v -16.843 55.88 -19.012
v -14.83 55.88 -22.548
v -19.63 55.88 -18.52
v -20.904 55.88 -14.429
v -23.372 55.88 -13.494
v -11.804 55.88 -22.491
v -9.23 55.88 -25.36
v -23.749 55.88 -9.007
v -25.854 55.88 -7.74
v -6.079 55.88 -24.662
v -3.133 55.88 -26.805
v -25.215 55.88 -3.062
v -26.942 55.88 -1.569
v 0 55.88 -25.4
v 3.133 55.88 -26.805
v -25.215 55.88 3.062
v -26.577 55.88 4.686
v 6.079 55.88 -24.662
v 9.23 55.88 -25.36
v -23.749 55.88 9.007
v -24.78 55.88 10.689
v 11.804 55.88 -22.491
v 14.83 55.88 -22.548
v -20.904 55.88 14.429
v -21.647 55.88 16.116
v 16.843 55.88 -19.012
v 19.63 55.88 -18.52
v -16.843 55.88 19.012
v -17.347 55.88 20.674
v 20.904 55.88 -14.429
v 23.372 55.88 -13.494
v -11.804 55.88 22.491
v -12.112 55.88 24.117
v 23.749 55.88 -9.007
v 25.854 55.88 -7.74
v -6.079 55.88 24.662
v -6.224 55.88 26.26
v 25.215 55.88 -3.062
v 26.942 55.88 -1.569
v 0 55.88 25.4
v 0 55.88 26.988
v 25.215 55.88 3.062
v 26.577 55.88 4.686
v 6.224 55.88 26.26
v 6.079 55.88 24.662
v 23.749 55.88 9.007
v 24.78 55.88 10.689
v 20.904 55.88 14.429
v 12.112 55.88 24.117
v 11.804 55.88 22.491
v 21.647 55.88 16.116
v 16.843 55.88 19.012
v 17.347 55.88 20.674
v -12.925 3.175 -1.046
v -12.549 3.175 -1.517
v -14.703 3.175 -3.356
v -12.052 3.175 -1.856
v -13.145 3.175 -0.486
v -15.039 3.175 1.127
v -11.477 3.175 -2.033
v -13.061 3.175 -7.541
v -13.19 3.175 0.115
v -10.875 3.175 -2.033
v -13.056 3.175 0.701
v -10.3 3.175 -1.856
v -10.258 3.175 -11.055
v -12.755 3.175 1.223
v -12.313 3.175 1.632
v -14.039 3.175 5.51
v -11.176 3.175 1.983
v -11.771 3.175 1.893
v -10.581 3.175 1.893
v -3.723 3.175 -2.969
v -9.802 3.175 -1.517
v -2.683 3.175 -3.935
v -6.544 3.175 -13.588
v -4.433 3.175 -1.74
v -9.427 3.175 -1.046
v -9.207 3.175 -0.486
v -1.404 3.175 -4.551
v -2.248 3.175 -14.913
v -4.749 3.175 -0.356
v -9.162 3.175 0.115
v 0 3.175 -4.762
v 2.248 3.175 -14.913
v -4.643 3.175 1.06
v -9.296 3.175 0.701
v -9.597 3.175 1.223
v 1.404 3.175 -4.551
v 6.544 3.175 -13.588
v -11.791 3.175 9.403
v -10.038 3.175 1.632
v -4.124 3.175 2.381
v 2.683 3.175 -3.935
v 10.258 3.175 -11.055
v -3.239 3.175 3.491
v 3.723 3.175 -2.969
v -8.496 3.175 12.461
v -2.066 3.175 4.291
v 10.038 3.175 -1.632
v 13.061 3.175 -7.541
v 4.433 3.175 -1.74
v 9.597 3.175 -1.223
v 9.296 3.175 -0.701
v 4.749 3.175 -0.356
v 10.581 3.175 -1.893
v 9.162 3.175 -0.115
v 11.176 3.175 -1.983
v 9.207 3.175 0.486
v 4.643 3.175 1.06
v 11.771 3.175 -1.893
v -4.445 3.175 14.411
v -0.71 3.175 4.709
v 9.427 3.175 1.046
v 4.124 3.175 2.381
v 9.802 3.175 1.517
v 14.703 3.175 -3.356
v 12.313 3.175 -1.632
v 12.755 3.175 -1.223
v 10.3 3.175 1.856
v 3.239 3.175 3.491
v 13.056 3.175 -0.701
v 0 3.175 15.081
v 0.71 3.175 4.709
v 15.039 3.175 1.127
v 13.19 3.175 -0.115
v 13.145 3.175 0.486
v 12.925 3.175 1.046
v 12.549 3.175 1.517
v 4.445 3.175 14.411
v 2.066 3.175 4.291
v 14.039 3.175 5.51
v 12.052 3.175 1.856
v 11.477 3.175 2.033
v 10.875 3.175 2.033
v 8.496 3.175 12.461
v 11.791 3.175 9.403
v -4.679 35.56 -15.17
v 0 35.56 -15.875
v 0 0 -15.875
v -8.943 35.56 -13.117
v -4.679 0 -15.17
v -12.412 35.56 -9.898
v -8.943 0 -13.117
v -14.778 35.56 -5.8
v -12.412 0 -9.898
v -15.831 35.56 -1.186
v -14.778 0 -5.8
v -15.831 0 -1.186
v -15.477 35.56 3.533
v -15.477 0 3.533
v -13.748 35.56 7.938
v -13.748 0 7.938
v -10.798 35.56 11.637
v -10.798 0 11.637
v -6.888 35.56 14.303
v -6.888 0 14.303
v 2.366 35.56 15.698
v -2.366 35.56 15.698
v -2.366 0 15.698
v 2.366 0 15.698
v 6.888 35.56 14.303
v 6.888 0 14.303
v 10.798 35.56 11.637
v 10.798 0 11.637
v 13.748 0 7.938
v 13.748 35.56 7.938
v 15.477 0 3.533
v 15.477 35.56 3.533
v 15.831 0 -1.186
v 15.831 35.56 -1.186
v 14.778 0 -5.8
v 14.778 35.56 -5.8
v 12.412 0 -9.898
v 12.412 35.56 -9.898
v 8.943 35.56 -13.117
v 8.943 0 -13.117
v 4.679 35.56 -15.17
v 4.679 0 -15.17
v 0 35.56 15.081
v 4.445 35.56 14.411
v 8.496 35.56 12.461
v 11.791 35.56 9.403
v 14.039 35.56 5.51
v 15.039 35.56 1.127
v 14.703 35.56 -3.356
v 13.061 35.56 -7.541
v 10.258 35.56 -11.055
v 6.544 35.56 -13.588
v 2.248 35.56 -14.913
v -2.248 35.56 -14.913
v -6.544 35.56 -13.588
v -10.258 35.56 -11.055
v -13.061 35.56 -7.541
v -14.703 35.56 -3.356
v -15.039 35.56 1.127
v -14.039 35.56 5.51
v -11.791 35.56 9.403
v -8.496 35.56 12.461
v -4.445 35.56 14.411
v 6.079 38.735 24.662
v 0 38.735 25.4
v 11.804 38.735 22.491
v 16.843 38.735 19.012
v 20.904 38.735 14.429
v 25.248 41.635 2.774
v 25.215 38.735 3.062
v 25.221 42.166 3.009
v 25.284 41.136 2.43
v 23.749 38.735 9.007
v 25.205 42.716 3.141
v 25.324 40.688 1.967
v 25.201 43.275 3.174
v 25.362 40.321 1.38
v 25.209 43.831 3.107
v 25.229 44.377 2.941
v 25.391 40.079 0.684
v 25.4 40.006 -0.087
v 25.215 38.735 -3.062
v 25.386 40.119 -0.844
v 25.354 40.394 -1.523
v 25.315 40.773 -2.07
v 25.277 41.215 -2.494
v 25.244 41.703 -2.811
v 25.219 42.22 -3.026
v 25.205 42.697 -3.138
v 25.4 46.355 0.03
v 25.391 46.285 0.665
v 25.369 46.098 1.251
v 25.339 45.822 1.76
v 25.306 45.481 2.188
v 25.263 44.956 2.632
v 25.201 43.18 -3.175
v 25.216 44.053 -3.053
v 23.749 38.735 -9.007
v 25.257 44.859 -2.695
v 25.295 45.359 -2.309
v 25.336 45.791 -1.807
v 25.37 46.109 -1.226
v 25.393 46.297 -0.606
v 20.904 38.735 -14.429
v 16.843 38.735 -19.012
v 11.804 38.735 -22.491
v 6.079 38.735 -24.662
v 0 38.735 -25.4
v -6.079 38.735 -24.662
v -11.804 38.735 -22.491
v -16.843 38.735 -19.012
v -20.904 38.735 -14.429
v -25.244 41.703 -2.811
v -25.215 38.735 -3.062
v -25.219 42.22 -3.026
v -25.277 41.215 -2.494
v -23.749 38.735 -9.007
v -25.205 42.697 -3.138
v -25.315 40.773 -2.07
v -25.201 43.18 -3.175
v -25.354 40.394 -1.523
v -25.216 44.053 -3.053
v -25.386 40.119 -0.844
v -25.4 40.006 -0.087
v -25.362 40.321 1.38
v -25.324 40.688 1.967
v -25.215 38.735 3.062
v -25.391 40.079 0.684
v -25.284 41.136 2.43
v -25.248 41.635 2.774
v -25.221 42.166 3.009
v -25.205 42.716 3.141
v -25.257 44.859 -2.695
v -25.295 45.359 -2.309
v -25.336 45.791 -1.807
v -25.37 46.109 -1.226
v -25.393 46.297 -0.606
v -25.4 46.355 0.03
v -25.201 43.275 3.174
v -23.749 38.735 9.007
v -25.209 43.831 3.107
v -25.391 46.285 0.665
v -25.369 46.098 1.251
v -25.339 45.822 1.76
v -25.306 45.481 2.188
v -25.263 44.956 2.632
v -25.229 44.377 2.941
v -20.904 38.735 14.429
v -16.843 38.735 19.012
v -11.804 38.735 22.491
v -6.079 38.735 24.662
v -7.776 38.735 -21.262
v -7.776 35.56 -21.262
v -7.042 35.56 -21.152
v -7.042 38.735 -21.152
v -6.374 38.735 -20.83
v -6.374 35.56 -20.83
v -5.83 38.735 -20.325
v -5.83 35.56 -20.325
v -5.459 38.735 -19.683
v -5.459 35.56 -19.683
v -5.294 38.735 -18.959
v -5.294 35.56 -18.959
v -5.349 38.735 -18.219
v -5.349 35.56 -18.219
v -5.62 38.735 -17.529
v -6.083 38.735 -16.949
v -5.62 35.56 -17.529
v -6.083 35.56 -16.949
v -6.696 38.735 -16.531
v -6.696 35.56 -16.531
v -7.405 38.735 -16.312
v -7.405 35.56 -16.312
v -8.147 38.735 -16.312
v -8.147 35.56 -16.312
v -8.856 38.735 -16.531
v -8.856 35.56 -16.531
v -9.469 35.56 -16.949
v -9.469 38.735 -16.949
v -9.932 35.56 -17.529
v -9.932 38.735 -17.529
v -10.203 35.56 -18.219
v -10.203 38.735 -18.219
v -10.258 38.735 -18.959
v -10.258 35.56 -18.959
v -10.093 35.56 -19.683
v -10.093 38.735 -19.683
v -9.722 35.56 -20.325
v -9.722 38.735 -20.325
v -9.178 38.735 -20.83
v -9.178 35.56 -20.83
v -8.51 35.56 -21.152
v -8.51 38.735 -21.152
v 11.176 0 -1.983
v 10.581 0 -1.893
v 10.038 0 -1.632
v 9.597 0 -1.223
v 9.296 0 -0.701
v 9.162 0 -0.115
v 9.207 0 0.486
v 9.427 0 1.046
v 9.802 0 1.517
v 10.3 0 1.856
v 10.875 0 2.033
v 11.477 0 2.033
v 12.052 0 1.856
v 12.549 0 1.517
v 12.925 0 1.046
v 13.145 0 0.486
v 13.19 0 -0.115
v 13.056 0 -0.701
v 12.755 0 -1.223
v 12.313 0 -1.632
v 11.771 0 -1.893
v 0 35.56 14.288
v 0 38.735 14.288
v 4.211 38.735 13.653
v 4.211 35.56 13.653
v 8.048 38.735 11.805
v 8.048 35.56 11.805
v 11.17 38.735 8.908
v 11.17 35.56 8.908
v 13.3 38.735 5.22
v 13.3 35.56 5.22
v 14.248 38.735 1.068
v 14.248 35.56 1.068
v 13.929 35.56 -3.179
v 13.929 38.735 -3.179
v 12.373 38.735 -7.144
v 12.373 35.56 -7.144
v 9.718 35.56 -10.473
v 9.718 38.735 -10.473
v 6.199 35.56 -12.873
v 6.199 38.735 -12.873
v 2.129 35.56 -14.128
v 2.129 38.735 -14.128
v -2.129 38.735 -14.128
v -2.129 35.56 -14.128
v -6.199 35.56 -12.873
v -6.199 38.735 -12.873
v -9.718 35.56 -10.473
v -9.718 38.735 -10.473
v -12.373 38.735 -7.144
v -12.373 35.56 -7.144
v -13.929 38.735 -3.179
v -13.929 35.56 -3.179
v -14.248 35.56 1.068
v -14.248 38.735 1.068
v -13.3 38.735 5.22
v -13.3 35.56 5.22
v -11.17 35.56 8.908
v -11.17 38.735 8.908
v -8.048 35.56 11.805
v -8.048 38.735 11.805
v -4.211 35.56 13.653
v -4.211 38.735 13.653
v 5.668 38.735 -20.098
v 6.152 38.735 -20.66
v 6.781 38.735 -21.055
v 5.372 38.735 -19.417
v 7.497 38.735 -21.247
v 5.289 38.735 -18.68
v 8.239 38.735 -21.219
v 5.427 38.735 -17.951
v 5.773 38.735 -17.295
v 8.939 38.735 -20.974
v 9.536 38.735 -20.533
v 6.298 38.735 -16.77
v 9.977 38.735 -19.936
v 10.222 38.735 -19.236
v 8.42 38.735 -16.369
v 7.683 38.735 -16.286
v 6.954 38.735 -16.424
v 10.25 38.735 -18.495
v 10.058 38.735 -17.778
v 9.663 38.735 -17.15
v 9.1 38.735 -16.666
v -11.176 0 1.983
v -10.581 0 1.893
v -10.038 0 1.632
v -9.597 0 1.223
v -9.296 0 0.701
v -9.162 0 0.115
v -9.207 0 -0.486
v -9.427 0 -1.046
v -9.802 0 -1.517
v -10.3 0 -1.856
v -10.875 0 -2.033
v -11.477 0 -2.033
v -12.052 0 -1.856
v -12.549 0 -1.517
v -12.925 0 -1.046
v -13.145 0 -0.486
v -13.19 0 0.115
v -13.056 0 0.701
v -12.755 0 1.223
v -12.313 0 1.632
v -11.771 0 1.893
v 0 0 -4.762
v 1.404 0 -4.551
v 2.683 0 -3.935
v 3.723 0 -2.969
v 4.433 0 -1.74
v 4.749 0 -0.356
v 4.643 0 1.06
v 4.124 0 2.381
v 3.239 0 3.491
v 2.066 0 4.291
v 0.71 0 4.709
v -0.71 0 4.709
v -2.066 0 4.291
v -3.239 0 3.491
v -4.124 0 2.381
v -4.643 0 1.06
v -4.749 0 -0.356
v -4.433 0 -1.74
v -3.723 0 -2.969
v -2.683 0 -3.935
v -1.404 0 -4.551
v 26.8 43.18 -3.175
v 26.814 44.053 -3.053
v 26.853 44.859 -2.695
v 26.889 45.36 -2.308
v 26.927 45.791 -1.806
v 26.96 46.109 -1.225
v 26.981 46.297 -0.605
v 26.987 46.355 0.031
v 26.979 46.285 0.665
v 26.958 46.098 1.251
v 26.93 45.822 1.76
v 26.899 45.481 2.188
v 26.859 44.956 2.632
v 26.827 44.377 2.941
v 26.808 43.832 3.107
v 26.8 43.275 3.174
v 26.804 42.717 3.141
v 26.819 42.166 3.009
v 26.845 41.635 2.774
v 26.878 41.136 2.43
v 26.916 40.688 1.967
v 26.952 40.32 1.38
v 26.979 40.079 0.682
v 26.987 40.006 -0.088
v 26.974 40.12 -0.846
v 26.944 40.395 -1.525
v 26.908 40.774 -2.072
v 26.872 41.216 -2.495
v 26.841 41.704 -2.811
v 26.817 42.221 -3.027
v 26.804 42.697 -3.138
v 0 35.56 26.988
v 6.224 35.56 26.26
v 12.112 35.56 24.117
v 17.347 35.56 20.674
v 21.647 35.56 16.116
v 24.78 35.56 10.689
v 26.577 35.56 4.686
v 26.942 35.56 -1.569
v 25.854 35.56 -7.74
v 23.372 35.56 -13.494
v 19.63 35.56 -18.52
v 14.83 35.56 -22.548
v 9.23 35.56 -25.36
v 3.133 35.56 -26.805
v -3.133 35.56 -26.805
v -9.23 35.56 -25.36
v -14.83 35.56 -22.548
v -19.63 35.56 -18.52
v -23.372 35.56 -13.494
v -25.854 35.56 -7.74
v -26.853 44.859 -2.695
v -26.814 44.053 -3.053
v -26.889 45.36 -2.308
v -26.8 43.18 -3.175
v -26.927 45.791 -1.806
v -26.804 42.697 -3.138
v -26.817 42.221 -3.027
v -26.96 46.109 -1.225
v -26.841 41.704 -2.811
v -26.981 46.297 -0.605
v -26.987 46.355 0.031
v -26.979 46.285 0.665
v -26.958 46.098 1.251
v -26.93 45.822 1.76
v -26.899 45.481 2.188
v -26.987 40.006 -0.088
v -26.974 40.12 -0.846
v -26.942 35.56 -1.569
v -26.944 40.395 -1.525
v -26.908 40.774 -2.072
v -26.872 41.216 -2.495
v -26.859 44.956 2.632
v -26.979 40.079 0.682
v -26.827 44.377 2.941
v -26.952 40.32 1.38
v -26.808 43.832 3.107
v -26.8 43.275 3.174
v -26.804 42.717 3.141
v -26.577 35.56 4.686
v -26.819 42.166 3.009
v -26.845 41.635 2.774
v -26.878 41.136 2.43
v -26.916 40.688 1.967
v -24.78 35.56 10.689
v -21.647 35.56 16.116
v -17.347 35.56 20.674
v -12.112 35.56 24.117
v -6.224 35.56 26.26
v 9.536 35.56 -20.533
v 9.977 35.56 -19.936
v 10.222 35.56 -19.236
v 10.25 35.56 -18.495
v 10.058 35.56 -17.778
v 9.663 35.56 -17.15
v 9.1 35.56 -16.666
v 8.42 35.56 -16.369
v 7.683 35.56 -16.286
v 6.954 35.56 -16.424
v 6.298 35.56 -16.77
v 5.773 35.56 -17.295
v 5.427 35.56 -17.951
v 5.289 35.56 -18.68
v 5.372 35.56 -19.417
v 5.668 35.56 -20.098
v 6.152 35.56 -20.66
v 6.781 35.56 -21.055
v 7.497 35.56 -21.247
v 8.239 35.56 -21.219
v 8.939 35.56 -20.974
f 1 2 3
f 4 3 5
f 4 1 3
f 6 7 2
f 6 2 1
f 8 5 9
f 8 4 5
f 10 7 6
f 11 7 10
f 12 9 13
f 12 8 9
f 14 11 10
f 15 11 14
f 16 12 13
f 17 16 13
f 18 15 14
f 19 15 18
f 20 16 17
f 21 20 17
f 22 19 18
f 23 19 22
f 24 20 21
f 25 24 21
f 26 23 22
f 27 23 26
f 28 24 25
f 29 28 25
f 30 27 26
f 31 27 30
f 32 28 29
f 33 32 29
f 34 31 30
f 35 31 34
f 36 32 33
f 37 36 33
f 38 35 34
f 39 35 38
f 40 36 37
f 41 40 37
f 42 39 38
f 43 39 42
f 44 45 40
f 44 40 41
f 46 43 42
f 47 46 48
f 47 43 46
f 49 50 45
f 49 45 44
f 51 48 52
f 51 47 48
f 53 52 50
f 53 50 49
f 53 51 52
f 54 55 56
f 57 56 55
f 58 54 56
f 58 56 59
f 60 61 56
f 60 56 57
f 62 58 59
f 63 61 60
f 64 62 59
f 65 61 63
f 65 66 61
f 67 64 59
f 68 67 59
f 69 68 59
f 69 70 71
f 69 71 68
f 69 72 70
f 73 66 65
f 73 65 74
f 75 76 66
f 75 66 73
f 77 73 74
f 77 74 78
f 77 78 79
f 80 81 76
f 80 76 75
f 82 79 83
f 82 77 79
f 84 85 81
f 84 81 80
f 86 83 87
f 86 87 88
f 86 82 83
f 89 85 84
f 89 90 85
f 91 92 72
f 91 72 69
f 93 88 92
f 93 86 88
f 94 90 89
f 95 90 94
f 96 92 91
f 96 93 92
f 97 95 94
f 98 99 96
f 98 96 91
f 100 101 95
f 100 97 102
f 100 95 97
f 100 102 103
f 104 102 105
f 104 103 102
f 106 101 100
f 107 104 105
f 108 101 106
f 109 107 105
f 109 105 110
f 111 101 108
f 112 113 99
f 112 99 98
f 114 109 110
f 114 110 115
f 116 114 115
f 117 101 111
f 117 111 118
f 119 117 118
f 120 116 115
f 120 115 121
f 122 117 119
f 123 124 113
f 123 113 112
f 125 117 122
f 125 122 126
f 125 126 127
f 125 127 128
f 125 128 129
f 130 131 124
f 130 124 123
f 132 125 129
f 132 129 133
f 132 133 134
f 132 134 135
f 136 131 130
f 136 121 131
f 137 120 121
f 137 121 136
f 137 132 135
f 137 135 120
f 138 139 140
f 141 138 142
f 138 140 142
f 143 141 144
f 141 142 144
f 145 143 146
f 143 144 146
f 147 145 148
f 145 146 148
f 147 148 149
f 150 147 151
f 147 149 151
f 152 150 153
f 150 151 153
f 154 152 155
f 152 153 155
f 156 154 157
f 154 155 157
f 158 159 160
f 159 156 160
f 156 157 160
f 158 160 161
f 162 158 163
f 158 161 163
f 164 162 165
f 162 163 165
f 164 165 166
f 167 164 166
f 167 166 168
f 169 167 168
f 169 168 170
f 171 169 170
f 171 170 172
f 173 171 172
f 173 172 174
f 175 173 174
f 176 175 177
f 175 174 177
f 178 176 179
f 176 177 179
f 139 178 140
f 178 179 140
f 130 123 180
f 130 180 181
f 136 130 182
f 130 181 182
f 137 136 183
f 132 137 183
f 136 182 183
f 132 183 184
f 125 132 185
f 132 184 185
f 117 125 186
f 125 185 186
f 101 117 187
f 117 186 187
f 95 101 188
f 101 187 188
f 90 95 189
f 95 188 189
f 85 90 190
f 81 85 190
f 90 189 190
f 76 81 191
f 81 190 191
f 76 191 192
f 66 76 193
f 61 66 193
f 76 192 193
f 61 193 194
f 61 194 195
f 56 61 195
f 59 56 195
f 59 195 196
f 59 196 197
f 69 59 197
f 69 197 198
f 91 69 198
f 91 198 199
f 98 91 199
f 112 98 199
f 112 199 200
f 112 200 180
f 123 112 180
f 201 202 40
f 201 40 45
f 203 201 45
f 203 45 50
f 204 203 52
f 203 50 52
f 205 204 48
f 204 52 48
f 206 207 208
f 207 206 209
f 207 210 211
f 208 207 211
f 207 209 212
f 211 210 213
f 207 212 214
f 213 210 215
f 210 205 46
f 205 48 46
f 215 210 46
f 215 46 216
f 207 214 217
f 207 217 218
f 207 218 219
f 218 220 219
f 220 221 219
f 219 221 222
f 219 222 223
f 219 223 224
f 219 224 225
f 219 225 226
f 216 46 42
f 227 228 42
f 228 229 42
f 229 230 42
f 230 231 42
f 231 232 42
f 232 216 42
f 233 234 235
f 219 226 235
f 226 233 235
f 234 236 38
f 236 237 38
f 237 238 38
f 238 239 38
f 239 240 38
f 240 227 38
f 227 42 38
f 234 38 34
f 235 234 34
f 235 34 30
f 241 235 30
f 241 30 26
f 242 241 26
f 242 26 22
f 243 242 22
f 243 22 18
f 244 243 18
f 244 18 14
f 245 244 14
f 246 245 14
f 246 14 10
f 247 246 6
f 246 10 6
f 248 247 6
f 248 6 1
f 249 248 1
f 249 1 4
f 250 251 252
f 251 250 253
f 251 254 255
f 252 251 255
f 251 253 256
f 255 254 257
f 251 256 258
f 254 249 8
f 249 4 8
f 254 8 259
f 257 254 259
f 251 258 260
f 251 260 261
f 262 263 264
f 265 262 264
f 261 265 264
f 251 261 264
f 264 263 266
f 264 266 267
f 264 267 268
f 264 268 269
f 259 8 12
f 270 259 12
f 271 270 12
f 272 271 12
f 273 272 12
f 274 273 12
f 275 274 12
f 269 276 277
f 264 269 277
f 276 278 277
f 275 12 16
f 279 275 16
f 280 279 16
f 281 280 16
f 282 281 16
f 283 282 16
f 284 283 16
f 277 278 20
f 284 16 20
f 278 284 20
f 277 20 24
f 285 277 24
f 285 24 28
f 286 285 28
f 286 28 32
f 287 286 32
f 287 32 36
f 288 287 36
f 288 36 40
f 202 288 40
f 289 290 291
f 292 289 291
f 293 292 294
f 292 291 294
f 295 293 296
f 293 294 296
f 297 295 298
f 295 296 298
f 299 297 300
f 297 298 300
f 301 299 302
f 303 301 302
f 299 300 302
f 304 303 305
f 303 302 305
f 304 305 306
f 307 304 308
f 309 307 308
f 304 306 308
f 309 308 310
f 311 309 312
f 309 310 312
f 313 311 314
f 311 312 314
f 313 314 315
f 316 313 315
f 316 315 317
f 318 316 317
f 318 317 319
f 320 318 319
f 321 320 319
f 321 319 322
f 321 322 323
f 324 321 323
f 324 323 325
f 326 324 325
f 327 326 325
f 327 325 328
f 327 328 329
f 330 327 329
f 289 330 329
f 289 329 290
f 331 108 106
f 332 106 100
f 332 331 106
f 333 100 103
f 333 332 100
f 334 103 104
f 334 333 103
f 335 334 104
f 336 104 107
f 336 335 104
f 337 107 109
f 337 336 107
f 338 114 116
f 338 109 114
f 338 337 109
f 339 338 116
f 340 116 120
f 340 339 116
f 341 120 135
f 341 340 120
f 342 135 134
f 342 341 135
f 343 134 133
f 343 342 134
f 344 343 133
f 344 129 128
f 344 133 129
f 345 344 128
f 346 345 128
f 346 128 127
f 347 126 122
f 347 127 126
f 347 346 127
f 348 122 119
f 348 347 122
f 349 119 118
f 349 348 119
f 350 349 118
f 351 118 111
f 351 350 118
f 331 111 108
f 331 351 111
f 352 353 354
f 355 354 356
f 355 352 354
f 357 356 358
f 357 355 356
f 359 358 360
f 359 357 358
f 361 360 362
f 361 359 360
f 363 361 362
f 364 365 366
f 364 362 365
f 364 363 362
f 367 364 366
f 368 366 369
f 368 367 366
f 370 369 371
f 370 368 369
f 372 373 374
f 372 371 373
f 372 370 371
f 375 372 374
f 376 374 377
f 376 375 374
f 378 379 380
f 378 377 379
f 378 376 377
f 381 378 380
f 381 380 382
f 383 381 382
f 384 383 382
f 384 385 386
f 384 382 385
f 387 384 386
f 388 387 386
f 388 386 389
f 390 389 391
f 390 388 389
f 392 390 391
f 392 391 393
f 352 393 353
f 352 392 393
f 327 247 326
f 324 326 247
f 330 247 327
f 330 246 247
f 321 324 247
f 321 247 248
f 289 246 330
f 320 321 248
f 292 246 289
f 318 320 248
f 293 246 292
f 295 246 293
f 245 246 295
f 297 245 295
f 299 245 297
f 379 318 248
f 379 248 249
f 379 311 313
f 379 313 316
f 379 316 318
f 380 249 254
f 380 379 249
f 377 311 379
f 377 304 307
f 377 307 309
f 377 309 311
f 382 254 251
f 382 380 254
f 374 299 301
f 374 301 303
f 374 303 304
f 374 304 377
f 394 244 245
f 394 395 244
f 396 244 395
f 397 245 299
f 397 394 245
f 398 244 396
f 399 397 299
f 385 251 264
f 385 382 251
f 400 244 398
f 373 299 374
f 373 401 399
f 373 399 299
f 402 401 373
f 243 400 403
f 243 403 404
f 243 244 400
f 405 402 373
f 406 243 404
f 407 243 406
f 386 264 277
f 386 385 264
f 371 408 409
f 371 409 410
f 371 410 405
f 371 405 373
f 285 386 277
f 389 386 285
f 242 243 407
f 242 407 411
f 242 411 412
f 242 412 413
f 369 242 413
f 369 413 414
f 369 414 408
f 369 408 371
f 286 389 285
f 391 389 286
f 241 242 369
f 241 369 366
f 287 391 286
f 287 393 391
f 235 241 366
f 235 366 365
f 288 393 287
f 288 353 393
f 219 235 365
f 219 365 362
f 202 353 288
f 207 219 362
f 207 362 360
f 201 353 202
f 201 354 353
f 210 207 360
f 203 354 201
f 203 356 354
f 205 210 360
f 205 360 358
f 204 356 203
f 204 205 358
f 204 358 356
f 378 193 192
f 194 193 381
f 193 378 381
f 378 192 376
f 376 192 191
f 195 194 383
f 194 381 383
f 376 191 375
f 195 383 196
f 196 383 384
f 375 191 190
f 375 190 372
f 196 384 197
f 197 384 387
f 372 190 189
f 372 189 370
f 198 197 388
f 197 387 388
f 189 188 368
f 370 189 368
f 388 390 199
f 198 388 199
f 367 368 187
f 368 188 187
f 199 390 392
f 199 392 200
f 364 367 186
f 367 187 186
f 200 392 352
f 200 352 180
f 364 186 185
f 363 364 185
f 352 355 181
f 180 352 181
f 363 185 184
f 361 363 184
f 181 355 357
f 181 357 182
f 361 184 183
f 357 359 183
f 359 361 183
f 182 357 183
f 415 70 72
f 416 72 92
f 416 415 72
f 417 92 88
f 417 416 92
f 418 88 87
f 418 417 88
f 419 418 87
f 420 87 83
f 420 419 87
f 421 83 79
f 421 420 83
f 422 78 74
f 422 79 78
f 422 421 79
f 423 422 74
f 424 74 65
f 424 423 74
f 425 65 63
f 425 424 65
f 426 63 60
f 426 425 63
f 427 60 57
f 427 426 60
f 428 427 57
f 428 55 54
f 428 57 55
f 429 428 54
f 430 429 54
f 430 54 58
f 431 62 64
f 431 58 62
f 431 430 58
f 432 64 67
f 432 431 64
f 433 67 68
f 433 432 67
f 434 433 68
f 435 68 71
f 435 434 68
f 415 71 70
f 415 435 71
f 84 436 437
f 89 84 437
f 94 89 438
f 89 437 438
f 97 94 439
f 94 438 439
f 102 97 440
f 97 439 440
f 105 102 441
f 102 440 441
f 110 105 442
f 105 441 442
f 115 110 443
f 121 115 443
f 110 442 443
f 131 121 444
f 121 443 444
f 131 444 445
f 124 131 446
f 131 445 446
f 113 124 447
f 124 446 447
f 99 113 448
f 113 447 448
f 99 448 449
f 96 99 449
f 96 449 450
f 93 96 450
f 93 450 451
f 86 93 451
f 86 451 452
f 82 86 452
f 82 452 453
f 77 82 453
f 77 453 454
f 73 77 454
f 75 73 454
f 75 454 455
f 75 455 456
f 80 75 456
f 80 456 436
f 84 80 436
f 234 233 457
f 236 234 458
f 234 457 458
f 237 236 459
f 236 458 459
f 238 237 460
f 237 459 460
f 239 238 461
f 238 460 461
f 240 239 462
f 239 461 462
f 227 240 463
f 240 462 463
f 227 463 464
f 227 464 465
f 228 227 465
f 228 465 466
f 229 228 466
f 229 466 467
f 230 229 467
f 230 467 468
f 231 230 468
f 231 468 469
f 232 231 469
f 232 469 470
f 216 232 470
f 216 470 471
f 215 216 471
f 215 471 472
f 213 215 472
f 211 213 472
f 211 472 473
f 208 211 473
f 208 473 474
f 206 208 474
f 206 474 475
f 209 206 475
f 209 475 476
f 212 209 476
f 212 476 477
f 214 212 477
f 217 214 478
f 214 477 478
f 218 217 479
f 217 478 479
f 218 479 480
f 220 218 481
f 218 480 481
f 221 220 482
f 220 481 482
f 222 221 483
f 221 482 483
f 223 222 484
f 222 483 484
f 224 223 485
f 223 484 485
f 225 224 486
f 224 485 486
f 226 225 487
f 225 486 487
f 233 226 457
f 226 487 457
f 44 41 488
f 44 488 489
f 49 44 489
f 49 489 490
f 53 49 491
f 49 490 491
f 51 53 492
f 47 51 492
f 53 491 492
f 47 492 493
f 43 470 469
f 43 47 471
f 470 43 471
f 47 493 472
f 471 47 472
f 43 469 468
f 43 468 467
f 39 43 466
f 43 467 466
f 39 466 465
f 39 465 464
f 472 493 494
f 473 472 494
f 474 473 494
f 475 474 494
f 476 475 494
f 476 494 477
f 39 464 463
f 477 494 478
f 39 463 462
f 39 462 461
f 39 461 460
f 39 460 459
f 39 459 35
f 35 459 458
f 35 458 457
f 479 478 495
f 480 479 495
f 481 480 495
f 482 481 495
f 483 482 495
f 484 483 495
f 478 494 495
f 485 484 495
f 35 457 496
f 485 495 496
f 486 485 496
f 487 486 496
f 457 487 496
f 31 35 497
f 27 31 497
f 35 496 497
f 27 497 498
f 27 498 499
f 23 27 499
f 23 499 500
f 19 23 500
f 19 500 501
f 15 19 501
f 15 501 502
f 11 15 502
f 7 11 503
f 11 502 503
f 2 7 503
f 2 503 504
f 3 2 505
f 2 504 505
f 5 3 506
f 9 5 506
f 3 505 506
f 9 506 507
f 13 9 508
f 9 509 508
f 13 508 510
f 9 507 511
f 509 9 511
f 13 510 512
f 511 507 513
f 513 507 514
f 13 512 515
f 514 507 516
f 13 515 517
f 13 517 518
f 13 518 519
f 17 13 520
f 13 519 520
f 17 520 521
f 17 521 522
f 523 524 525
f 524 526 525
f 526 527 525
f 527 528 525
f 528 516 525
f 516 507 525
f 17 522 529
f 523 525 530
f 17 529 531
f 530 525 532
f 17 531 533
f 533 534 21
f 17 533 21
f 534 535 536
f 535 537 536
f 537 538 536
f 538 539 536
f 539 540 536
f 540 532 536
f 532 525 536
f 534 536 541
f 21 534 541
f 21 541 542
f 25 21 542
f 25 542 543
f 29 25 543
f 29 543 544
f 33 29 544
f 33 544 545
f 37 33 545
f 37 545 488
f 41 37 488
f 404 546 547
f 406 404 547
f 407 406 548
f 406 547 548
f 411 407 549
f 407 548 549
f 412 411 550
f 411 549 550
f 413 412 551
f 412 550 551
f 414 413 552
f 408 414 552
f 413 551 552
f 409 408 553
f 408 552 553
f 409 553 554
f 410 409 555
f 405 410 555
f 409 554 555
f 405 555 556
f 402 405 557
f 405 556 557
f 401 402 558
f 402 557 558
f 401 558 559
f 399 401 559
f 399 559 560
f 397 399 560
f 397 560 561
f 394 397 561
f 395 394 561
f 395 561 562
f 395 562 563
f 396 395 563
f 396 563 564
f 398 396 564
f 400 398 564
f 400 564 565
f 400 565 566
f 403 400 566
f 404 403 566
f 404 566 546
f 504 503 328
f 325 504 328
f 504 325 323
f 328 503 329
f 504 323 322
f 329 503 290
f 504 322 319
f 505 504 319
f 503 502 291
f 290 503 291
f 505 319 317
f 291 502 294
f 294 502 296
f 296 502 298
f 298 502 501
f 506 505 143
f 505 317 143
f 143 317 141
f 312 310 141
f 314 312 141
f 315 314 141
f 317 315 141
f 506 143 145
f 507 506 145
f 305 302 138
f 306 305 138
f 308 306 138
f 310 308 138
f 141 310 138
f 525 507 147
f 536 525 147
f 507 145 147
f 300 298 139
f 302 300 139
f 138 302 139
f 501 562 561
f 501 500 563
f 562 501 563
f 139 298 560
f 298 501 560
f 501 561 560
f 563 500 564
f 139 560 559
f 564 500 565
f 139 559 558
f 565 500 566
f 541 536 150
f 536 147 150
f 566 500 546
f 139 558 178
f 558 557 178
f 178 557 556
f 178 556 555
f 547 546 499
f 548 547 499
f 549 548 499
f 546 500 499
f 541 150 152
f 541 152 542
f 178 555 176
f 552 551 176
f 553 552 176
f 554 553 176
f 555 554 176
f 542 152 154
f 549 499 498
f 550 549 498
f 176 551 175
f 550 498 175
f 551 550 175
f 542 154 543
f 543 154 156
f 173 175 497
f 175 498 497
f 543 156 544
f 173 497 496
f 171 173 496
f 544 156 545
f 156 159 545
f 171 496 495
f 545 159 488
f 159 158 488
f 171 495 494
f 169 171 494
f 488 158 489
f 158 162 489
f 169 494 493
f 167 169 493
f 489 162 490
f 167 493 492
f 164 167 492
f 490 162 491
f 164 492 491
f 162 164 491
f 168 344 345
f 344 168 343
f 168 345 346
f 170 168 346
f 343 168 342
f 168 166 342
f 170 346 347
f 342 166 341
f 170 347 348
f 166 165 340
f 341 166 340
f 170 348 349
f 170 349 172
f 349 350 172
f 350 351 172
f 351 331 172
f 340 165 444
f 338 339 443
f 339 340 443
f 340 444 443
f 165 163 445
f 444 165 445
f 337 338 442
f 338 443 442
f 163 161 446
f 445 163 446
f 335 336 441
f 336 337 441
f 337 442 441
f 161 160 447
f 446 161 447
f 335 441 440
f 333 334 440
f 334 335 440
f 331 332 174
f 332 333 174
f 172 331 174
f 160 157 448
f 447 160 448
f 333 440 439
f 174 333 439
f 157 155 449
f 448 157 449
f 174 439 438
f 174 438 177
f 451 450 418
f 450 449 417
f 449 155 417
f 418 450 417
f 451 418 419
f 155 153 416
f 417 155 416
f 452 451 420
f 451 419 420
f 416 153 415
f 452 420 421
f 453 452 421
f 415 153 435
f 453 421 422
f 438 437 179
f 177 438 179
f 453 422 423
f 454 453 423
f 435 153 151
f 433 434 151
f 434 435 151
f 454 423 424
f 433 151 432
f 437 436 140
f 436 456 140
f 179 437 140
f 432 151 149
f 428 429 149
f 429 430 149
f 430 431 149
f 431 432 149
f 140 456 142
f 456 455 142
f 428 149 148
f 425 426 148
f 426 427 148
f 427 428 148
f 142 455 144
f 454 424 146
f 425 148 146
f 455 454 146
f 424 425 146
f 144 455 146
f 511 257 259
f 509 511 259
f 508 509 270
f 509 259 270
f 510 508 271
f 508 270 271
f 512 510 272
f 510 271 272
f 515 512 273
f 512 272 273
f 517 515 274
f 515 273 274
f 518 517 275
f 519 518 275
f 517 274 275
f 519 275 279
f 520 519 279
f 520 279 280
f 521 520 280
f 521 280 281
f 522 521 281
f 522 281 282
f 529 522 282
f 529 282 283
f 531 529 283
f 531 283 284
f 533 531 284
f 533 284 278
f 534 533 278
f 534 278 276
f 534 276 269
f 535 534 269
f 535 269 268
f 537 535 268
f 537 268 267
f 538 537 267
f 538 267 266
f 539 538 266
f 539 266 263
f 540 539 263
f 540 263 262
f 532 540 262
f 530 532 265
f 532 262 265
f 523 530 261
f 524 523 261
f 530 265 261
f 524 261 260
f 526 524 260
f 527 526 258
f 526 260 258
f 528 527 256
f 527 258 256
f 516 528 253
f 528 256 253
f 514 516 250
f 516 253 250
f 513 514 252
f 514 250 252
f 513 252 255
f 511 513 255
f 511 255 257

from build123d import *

# Parameters (mm, degrees)
SKETCH1_R                  = 15.875
EXTRUDE2_DEPTH             = 38.1
SKETCH2_R                  = 4.7625
CUT_EXTRUDE1_DEPTH         = 45.22263278
SKETCH8_R                  = 15.08125
CUT_EXTRUDE3_DEPTH         = 34.925
SKETCH9_R                  = 24.789766377
CUT_EXTRUDE4_DEPTH         = 2.54
SKETCH10_R                 = 26.9875
EXTRUDE3_DEPTH             = 20.32
SKETCH11_R                 = 25.4
CUT_EXTRUDE5_DEPTH         = 17.145
SKETCH12_R                 = 14.2875
CUT_EXTRUDE6_DEPTH         = 53.16477655
F_9_0_196_DIAMETER_HOLE1_D = 4.9784
CIRPATTERN1_COUNT          = 2
CIRPATTERN1_ANGLE          = 45
SKETCH17_R                 = 3.175
CUT_EXTRUDE7_DEPTH         = 86.064550432
CIRPATTERN2_COUNT          = 2


with BuildPart() as part:
    # Sketch1 → Extrude2 (new body)
    with BuildSketch(Plane(origin=(0, 0, 0), x_dir=(1, 0, 0), z_dir=(0, 1, 0))):
        with Locations(Location((0, 0, 0), (0, 0, 90))):
            Circle(SKETCH1_R)
    extrude(amount=EXTRUDE2_DEPTH)

    # Sketch2 → Cut-Extrude1 (cut, through all)
    with BuildSketch(Plane.XZ):
        with Locations(Location((0, 0, 0), (0, 0, 270))):
            Circle(SKETCH2_R)
    extrude(amount=-CUT_EXTRUDE1_DEPTH, mode=Mode.SUBTRACT)

    # Sketch8 → Cut-Extrude3 (cut)
    with BuildSketch(Plane(origin=(0, 38.1, 0), x_dir=(-1, 0, 0), z_dir=(0, 1, 0))):
        with Locations(Location((0, 0, 0), (0, 0, 90))):
            Circle(SKETCH8_R)
    extrude(amount=-CUT_EXTRUDE3_DEPTH, mode=Mode.SUBTRACT)

    # Sketch9 → Cut-Extrude4 (cut)
    with BuildSketch(Plane(origin=(0, 38.1, 0), x_dir=(-1, 0, 0), z_dir=(0, 1, 0))):
        Circle(SKETCH9_R)
    extrude(amount=-CUT_EXTRUDE4_DEPTH, mode=Mode.SUBTRACT)

    # Sketch10 → Extrude3 (add)
    with BuildSketch(Plane(origin=(0, 35.56, 0), x_dir=(-1, 0, 0), z_dir=(0, 1, 0))):
        with Locations(Location((0, 0, 0), (0, 0, 90))):
            Circle(SKETCH10_R)
    extrude(amount=EXTRUDE3_DEPTH)

    # Sketch11 → Cut-Extrude5 (cut)
    with BuildSketch(Plane(origin=(0, 55.88, 0), x_dir=(-1, 0, 0), z_dir=(0, 1, 0))):
        with Locations(Location((0, 0, 0), (0, 0, 90))):
            Circle(SKETCH11_R)
    extrude(amount=-CUT_EXTRUDE5_DEPTH, mode=Mode.SUBTRACT)

    # Sketch12 → Cut-Extrude6 (cut, through all)
    with BuildSketch(Plane(origin=(0, 35.56, 0), x_dir=(-1, 0, 0), z_dir=(0, 1, 0))):
        with Locations(Location((0, 0, 0), (0, 0, 90))):
            Circle(SKETCH12_R)
    extrude(amount=CUT_EXTRUDE6_DEPTH, mode=Mode.SUBTRACT)

    # #9 (0.196) Diameter Hole1 (through all)
    with Locations(Plane(origin=(-7.776127346, 55.88, -18.773232101), x_dir=(0, 0, 1), z_dir=(0, 1, 0))):
        with Locations((0, 0)):
            f_9_0_196_diameter_hole1 = Hole(F_9_0_196_DIAMETER_HOLE1_D / 2)

    # CirPattern1: #9 (0.196) Diameter Hole1 ×2 about axis
    cirpattern1_axis = Axis((0, 83.588580262, 0), (0, -1, 0))
    for i in range(1, CIRPATTERN1_COUNT):
        add(f_9_0_196_diameter_hole1.rotate(cirpattern1_axis, i * CIRPATTERN1_ANGLE / (CIRPATTERN1_COUNT - 1)), mode=Mode.SUBTRACT)

    # Sketch17 → Cut-Extrude7 (cut, through all)
    with BuildSketch(Plane(origin=(41.153091309, 43.18, 0), x_dir=(0, 0, -1), z_dir=(1, 0, 0))):
        Circle(SKETCH17_R)
    extrude(amount=-CUT_EXTRUDE7_DEPTH, mode=Mode.SUBTRACT)

    # Sketch20 → #10-32 Tapped Hole1 (revolve, cut)
    with BuildSketch(Plane(origin=(11.175940885, 0, 0.036350046), x_dir=(0, 0, -1), z_dir=(1, 0, 0))):
        Polygon((0, 0), (0, 13.252917848), (2.0193, 12.0396), (2.0193, 0), align=None)
    f_10_32_tapped_hole1 = revolve(axis=Axis((11.175940885, -6.35, 0.036350046), (0, 1, 0)), mode=Mode.SUBTRACT)

    # CirPattern2: #10-32 Tapped Hole1 ×2 about axis
    cirpattern2_axis = Axis((0, 0, 0), (0, 1, 0))
    for i in range(1, CIRPATTERN2_COUNT):
        add(f_10_32_tapped_hole1.rotate(cirpattern2_axis, i * 360 / CIRPATTERN2_COUNT), mode=Mode.SUBTRACT)


solid = part.part
